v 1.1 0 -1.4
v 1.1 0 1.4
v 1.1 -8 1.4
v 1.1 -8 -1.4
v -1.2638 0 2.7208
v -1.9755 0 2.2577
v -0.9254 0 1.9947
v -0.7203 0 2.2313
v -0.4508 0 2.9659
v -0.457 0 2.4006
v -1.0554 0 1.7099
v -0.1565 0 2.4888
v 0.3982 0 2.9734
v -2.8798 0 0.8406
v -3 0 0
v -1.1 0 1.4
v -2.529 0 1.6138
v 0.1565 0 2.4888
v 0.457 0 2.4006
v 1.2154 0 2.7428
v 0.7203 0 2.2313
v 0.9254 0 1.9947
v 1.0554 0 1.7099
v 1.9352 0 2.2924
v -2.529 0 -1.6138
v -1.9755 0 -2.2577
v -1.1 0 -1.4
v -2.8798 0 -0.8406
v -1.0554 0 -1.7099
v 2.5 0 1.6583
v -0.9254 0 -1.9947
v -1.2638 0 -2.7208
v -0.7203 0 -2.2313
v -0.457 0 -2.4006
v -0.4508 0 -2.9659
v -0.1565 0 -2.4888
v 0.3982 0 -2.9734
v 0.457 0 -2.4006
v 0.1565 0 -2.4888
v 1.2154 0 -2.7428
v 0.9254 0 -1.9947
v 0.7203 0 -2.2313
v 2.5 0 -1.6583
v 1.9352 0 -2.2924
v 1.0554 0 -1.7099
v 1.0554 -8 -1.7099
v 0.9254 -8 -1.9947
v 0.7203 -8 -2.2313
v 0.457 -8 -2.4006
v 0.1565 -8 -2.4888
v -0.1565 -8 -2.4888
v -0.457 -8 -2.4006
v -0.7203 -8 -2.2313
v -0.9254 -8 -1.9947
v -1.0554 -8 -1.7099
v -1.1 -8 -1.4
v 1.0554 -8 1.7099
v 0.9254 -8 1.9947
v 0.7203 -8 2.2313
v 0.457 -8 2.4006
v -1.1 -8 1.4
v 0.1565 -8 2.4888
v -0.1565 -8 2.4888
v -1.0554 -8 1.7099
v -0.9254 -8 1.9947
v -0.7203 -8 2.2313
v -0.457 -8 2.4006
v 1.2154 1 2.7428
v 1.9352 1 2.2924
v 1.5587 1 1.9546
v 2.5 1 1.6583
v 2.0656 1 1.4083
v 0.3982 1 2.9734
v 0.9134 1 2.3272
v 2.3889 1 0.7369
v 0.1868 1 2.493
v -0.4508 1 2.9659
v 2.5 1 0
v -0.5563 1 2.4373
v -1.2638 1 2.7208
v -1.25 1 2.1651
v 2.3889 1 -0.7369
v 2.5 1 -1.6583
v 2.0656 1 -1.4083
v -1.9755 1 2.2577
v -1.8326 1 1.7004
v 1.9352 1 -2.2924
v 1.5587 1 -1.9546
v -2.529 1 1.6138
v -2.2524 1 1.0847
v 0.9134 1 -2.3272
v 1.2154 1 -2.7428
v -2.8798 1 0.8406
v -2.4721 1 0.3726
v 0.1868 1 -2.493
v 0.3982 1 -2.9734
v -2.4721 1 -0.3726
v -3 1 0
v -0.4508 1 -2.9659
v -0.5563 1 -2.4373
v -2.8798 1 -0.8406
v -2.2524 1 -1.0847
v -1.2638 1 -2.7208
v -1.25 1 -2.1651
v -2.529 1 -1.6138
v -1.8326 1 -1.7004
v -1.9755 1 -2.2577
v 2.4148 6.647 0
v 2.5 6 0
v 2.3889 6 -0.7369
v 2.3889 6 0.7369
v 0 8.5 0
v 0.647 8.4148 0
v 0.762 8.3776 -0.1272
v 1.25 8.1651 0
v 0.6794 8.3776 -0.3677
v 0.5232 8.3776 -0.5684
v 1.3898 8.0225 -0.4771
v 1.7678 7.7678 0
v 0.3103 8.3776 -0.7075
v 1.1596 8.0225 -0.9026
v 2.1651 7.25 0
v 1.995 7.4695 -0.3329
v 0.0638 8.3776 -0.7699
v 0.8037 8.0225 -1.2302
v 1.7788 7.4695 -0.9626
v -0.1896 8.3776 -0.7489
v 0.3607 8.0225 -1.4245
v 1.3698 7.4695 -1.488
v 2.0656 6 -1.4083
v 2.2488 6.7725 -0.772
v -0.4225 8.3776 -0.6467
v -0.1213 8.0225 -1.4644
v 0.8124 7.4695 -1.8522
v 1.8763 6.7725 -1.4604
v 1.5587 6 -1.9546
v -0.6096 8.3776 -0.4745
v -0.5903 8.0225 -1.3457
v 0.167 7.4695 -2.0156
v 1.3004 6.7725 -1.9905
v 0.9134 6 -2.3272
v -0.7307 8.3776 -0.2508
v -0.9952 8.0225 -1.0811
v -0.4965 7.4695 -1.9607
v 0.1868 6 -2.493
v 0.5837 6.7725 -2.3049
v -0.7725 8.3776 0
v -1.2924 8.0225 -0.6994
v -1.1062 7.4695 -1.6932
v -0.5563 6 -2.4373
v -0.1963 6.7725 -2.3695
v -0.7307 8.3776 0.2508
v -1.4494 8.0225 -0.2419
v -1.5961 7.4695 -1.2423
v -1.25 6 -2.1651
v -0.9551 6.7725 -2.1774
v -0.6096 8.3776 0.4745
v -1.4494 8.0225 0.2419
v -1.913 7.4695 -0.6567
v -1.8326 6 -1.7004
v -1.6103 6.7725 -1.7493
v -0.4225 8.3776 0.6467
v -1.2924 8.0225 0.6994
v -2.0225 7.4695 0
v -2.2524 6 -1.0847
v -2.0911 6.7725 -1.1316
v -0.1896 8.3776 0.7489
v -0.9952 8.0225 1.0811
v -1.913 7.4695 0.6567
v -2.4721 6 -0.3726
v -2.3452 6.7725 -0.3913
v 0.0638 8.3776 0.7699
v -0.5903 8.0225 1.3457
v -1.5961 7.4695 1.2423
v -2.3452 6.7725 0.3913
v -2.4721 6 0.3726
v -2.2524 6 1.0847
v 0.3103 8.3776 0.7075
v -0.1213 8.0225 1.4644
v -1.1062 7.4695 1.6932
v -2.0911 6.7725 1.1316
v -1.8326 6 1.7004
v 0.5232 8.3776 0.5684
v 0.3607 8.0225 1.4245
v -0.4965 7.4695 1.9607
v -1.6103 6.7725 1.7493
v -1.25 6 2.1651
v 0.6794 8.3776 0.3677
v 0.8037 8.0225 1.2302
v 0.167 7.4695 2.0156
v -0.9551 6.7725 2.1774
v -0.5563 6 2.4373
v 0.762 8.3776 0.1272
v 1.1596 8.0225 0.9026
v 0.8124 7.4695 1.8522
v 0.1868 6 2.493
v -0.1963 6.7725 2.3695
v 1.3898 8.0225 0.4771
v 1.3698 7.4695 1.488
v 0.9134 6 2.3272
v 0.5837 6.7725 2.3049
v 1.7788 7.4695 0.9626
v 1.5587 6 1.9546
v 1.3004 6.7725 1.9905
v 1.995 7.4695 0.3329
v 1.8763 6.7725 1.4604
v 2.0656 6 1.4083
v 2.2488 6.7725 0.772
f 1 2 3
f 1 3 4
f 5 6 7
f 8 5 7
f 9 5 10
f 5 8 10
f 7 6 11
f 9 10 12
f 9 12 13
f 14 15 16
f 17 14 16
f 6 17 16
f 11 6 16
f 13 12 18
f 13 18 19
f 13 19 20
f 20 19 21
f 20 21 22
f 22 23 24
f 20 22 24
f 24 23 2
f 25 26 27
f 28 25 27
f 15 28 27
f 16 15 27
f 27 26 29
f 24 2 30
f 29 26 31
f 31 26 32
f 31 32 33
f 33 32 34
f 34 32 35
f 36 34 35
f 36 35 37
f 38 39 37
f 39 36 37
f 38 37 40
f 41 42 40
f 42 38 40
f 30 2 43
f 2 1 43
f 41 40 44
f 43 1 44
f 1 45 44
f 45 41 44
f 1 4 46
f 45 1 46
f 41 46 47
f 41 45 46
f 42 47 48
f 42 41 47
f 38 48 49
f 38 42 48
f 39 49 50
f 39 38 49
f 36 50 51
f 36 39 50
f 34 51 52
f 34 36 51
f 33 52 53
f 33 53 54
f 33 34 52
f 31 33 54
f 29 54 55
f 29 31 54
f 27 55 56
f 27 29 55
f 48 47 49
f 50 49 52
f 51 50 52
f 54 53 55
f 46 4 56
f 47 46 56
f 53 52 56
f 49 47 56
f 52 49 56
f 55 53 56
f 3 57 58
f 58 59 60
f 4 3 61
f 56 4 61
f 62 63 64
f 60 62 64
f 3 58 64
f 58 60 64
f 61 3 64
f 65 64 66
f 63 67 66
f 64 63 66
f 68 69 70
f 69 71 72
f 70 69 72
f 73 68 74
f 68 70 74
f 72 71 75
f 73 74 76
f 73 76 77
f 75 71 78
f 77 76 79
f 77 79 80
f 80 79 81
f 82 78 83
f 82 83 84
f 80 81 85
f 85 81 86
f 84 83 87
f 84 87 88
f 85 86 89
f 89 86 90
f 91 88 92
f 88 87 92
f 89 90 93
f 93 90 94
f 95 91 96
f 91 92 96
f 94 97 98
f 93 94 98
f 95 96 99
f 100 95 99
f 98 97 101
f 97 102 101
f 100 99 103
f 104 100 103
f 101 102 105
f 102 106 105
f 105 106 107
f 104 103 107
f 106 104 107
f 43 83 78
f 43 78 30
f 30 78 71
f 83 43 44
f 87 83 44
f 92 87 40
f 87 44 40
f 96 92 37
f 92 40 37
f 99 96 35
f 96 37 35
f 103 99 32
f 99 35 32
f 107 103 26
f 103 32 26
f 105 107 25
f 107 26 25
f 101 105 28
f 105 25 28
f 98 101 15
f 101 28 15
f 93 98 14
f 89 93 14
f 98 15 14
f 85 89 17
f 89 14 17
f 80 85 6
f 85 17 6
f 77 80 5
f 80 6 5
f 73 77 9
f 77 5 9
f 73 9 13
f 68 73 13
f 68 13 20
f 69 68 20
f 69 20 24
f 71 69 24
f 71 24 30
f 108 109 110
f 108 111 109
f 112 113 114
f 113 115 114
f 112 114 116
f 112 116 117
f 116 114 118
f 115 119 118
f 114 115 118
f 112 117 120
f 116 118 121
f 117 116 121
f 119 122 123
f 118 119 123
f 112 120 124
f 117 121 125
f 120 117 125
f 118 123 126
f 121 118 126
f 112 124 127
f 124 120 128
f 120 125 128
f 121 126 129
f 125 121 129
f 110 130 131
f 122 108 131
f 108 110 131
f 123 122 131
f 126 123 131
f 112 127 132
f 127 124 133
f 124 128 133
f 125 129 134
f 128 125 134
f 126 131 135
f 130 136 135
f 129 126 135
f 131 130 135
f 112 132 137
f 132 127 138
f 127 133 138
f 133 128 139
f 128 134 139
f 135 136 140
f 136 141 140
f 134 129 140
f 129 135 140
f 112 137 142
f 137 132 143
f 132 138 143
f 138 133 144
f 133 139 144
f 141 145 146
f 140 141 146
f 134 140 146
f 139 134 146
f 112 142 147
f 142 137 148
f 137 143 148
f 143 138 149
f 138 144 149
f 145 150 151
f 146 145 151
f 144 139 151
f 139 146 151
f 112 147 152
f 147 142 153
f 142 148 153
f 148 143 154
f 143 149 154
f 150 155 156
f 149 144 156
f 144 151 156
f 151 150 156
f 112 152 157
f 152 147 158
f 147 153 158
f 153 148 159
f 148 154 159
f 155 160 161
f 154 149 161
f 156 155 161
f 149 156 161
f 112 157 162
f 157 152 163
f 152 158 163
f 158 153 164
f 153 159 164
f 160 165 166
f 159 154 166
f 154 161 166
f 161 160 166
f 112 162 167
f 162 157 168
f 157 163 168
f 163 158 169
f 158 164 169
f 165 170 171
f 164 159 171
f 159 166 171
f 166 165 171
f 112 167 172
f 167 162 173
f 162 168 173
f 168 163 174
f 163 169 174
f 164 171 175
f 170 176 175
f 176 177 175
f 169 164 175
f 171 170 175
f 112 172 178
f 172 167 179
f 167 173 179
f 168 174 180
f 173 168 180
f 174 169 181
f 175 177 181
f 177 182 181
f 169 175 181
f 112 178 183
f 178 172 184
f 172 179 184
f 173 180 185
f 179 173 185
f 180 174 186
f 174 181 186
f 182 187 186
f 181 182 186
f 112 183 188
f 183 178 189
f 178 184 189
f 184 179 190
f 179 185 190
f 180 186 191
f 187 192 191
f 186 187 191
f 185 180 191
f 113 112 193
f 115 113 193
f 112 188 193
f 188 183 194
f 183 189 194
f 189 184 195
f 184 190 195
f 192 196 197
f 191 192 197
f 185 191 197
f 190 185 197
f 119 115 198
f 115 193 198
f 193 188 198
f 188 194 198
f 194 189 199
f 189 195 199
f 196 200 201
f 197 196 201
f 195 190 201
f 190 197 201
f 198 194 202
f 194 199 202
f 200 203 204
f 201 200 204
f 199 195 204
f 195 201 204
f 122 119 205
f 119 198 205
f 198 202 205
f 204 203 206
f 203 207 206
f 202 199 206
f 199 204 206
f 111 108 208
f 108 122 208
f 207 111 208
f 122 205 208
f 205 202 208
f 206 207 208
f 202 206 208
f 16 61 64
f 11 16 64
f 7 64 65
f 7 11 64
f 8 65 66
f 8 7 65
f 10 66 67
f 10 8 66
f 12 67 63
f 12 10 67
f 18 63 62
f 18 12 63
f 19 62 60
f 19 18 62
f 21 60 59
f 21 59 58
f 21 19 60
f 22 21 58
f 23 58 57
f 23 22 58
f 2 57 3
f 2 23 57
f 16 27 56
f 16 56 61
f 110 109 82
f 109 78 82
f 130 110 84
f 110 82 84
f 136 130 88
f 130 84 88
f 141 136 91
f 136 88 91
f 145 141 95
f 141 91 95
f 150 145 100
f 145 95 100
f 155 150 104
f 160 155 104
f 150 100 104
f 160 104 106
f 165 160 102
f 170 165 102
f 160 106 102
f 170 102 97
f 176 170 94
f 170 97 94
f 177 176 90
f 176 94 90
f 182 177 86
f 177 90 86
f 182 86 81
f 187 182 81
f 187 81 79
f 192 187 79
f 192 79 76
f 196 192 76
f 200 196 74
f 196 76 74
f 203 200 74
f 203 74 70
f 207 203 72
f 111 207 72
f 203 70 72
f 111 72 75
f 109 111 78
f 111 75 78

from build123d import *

# Parameters (mm, degrees)
CUT_EXTRUDE1_REACH  = 3
BOSS_EXTRUDE1_DEPTH = 8


with BuildPart() as part:
    # Sketch1 → Revolve1 (revolve)
    with BuildSketch(Plane.XY):
        with BuildLine():
            Line((0, 0), (0, 8.5))
            ThreePointArc((0, 8.5), (1.767766953, 7.767766953), (2.5, 6))
            Line((2.5, 6), (2.5, 1))
            Line((2.5, 1), (3, 1))
            Line((3, 1), (3, 0))
            Line((3, 0), (0, 0))
        make_face()
    revolve(axis=Axis((0, 0, 0), (0, 1, 0)))

    # Sketch2 → Cut-Extrude1 (cut, up to next)
    with BuildSketch(Plane(origin=(0, 1, 0), x_dir=(1, 0, 0), z_dir=(0, 1, 0)), mode=Mode.PRIVATE) as cut_extrude1_sk1:
        with BuildLine():
            Line((2.5, 1.658312395), (2.5, -1.658312395))
            ThreePointArc((2.5, -1.658312395), (3, 0), (2.5, 1.658312395))
        make_face()
    cut_extrude1_tool1 = extrude(cut_extrude1_sk1.sketch, amount=-CUT_EXTRUDE1_REACH, mode=Mode.PRIVATE) & part.part
    add(cut_extrude1_tool1.solids().sort_by_distance((2.701501, 1, 0))[0], mode=Mode.SUBTRACT)

    # Sketch3 → Boss-Extrude1 (add)
    with BuildSketch(Plane.XZ):
        with BuildLine():
            Line((1.1, 1.4), (1.1, -1.4))
            ThreePointArc((1.1, -1.4), (0, -2.5), (-1.1, -1.4))
            Line((-1.1, -1.4), (-1.1, 1.4))
            ThreePointArc((-1.1, 1.4), (0, 2.5), (1.1, 1.4))
        make_face()
    extrude(amount=BOSS_EXTRUDE1_DEPTH)


solid = part.part
